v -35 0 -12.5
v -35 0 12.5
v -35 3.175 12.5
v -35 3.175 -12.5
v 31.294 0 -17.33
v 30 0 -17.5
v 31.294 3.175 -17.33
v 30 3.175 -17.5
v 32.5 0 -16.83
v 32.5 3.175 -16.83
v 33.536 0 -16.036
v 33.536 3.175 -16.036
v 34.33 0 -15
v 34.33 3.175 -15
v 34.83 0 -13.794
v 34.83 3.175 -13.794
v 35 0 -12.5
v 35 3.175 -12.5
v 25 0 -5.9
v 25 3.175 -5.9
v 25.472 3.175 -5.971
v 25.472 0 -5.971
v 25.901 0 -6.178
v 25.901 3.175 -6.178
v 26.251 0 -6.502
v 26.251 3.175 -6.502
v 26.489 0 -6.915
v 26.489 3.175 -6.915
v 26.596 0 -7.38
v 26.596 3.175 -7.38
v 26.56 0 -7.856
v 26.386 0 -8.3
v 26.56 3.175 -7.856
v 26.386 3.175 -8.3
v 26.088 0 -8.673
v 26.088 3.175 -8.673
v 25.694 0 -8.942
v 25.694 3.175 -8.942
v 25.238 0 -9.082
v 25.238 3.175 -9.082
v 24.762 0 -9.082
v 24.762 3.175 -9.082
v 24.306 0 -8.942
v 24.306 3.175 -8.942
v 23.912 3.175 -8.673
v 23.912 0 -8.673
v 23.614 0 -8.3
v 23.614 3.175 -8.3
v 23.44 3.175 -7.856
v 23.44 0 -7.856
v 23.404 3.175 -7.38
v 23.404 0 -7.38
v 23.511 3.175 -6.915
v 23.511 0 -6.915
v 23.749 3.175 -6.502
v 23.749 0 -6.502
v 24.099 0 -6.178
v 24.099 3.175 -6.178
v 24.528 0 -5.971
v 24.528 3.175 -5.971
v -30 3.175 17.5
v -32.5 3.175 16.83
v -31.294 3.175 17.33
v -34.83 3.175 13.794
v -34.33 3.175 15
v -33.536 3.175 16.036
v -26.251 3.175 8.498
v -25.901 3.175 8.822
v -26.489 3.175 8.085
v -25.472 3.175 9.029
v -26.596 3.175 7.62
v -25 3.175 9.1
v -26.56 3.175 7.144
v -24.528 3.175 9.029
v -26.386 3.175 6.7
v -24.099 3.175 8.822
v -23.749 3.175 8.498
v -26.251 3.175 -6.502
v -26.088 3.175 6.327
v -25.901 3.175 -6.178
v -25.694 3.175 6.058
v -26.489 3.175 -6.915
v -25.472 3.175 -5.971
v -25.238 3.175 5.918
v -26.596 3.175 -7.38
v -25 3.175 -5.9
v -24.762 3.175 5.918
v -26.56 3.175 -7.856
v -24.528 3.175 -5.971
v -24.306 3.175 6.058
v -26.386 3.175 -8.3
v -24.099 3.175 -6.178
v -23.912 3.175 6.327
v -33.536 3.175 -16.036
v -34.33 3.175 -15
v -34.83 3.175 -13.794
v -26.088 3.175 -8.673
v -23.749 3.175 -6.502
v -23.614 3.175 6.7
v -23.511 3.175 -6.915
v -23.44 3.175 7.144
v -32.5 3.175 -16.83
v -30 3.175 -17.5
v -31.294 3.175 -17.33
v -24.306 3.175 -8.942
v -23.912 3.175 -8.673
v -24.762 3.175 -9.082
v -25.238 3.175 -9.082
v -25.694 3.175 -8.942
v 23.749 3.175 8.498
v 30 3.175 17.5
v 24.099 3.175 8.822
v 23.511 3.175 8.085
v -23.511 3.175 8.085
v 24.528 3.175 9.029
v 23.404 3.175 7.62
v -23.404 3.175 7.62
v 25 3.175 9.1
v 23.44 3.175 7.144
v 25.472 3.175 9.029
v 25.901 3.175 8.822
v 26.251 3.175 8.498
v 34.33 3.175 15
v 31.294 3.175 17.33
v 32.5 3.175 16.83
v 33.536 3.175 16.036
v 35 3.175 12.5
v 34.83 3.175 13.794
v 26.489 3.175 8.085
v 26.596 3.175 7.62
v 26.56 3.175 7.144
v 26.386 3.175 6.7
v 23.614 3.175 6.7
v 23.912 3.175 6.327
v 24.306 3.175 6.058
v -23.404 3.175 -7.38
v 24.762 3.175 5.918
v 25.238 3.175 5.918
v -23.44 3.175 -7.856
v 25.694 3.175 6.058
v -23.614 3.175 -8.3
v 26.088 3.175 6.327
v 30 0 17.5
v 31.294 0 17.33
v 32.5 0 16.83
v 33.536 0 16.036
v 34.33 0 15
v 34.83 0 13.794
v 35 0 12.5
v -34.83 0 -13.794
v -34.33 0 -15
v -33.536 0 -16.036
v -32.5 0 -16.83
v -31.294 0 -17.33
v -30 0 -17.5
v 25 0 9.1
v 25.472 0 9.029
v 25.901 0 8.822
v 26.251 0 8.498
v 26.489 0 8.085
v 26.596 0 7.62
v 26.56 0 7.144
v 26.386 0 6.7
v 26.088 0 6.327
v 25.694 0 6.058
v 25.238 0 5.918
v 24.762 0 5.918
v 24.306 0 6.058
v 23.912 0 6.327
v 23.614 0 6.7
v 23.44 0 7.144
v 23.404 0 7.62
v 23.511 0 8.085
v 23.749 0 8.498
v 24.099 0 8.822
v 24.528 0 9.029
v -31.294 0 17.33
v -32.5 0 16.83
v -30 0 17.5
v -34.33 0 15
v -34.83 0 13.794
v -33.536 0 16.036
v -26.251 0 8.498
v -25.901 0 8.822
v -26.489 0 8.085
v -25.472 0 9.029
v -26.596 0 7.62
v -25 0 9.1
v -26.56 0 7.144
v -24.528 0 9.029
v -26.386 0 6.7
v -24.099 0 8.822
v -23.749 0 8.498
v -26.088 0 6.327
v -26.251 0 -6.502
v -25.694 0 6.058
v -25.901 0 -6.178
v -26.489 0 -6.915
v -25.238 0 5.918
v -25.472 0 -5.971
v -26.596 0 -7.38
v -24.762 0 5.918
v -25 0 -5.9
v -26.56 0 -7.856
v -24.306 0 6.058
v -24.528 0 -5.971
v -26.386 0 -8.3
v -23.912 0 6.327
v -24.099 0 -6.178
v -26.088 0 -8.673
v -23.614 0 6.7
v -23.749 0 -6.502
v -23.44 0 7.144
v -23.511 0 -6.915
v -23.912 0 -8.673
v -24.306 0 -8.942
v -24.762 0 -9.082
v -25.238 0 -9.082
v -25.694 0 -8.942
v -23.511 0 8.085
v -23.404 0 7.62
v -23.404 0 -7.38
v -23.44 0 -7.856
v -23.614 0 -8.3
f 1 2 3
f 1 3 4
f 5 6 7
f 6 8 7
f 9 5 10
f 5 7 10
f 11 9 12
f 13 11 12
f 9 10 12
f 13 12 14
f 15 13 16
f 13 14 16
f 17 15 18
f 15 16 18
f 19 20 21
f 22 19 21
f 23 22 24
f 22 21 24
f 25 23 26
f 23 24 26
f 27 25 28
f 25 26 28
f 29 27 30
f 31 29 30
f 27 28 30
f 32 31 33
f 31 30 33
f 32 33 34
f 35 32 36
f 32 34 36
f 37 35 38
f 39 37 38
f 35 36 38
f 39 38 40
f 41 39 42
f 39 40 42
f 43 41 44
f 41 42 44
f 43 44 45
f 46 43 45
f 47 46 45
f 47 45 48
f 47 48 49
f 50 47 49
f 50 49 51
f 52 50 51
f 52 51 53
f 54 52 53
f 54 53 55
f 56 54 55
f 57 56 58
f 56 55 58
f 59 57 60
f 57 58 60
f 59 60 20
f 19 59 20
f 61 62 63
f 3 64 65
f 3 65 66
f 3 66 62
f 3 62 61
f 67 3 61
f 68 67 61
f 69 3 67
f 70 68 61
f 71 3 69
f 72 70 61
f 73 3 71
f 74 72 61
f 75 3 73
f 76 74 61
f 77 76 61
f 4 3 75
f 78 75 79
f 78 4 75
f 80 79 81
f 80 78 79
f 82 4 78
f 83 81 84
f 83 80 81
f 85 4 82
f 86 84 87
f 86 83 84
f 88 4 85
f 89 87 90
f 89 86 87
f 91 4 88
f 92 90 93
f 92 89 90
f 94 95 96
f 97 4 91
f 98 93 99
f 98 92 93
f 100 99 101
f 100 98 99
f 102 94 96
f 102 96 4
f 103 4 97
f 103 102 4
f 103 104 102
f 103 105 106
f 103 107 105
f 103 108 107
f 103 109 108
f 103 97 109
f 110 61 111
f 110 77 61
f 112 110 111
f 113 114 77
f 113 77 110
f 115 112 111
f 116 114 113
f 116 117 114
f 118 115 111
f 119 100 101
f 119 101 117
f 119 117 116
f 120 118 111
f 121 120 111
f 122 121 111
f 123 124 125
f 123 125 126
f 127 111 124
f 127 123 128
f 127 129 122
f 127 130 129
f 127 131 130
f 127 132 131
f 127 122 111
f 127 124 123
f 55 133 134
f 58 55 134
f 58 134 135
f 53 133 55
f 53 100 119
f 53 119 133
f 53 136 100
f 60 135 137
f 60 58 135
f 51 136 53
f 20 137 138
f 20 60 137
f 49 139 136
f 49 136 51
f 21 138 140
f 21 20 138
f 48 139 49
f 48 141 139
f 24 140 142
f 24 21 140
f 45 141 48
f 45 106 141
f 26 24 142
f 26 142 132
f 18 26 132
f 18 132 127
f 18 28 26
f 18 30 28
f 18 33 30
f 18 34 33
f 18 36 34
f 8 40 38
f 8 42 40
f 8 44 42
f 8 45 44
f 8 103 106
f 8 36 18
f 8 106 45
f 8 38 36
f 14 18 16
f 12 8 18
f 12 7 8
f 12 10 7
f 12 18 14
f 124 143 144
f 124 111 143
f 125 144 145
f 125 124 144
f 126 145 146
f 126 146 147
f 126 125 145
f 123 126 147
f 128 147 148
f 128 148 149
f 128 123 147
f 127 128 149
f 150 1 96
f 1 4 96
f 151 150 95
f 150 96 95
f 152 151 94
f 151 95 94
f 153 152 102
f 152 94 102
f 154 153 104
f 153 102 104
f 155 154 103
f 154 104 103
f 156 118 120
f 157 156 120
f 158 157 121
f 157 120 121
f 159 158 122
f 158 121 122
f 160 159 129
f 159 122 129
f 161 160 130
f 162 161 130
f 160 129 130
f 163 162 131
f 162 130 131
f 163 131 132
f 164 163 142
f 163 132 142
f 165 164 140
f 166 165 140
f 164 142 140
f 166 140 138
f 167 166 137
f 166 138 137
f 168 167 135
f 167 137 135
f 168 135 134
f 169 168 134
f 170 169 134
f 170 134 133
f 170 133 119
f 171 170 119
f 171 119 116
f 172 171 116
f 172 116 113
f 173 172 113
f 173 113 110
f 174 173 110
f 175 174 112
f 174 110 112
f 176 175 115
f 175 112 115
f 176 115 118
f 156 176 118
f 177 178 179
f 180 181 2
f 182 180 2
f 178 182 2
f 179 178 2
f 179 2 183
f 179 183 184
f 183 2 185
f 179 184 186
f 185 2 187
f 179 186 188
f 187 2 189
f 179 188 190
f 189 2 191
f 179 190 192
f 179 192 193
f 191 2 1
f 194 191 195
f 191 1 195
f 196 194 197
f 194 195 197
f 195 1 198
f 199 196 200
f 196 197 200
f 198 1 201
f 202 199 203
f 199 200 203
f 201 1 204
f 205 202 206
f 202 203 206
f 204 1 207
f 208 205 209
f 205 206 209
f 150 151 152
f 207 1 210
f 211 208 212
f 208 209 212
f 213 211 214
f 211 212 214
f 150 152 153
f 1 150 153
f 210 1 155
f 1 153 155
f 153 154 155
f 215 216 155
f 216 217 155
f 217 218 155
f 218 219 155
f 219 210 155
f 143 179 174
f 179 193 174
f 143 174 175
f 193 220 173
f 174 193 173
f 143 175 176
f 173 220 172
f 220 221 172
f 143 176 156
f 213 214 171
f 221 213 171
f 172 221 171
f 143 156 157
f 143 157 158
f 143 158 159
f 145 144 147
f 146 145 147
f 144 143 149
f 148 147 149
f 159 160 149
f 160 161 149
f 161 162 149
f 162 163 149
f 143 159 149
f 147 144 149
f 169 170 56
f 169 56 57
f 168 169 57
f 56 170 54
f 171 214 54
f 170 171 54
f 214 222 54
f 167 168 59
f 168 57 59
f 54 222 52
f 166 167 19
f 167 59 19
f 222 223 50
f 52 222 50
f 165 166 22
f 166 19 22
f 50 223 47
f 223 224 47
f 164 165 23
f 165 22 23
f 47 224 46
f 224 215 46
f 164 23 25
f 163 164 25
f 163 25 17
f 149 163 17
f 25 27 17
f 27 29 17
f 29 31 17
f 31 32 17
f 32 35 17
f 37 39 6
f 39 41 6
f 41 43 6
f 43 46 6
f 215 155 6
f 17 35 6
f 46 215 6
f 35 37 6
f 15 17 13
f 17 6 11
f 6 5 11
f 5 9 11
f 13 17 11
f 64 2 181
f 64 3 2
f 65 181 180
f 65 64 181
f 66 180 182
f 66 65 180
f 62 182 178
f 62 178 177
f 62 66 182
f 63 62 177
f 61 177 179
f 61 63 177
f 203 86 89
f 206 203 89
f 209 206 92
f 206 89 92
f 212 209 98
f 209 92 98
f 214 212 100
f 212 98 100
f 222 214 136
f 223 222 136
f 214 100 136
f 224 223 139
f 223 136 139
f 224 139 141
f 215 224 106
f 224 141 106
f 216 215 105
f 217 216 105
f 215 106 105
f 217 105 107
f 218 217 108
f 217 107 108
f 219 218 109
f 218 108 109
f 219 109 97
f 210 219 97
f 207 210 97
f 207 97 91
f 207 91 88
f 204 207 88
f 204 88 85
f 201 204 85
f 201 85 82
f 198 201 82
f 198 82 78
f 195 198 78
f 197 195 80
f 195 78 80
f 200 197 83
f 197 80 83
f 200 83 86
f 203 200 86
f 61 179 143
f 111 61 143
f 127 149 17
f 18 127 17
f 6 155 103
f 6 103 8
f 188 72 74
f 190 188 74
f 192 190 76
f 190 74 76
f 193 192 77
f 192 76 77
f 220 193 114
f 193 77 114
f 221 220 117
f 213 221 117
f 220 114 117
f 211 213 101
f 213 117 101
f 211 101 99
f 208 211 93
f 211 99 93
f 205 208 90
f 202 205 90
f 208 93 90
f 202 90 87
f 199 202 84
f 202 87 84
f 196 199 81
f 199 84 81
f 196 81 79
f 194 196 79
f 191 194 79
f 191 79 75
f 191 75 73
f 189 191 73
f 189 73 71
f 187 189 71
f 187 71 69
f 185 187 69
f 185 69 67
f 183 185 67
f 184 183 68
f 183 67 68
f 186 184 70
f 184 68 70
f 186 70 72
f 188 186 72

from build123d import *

# Parameters (mm, degrees)
SKETCH1_W           = 70
SKETCH1_H           = 35
BOSS_EXTRUDE1_DEPTH = 3.175
SKETCH2_R           = 1.6
CUT_EXTRUDE1_DEPTH  = 3.175
FILLET1_R           = 5


with BuildPart() as part:
    # Sketch1 → Boss-Extrude1 (new body)
    with BuildSketch(Plane(origin=(0, 0, 0), x_dir=(1, 0, 0), z_dir=(0, 1, 0))):
        Rectangle(SKETCH1_W, SKETCH1_H)
    extrude(amount=BOSS_EXTRUDE1_DEPTH)

    # Sketch2 → Cut-Extrude1 (cut)
    with BuildSketch(Plane(origin=(0, 3.175, 0), x_dir=(1, 0, 0), z_dir=(0, 1, 0))):
        with Locations(Location((-25, 7.5, 0), (0, 0, 270))):
            Circle(SKETCH2_R)
        with Locations(Location((-25, -7.5, 0), (0, 0, 270))):
            Circle(SKETCH2_R)
        with Locations(Location((25, -7.5, 0), (0, 0, 270))):
            Circle(SKETCH2_R)
        with Locations(Location((25, 7.5, 0), (0, 0, 270))):
            Circle(SKETCH2_R)
    extrude(amount=-CUT_EXTRUDE1_DEPTH, mode=Mode.SUBTRACT)

    # Fillet1
    fillet1_edges = [part.edges().sort_by_distance(p)[0] for p in [
        (35, 1.5875, 17.5),
        (-35, 1.5875, 17.5),
        (-35, 1.5875, -17.5),
        (35, 1.5875, -17.5),
    ]]
    fillet(fillet1_edges, radius=FILLET1_R)


solid = part.part
